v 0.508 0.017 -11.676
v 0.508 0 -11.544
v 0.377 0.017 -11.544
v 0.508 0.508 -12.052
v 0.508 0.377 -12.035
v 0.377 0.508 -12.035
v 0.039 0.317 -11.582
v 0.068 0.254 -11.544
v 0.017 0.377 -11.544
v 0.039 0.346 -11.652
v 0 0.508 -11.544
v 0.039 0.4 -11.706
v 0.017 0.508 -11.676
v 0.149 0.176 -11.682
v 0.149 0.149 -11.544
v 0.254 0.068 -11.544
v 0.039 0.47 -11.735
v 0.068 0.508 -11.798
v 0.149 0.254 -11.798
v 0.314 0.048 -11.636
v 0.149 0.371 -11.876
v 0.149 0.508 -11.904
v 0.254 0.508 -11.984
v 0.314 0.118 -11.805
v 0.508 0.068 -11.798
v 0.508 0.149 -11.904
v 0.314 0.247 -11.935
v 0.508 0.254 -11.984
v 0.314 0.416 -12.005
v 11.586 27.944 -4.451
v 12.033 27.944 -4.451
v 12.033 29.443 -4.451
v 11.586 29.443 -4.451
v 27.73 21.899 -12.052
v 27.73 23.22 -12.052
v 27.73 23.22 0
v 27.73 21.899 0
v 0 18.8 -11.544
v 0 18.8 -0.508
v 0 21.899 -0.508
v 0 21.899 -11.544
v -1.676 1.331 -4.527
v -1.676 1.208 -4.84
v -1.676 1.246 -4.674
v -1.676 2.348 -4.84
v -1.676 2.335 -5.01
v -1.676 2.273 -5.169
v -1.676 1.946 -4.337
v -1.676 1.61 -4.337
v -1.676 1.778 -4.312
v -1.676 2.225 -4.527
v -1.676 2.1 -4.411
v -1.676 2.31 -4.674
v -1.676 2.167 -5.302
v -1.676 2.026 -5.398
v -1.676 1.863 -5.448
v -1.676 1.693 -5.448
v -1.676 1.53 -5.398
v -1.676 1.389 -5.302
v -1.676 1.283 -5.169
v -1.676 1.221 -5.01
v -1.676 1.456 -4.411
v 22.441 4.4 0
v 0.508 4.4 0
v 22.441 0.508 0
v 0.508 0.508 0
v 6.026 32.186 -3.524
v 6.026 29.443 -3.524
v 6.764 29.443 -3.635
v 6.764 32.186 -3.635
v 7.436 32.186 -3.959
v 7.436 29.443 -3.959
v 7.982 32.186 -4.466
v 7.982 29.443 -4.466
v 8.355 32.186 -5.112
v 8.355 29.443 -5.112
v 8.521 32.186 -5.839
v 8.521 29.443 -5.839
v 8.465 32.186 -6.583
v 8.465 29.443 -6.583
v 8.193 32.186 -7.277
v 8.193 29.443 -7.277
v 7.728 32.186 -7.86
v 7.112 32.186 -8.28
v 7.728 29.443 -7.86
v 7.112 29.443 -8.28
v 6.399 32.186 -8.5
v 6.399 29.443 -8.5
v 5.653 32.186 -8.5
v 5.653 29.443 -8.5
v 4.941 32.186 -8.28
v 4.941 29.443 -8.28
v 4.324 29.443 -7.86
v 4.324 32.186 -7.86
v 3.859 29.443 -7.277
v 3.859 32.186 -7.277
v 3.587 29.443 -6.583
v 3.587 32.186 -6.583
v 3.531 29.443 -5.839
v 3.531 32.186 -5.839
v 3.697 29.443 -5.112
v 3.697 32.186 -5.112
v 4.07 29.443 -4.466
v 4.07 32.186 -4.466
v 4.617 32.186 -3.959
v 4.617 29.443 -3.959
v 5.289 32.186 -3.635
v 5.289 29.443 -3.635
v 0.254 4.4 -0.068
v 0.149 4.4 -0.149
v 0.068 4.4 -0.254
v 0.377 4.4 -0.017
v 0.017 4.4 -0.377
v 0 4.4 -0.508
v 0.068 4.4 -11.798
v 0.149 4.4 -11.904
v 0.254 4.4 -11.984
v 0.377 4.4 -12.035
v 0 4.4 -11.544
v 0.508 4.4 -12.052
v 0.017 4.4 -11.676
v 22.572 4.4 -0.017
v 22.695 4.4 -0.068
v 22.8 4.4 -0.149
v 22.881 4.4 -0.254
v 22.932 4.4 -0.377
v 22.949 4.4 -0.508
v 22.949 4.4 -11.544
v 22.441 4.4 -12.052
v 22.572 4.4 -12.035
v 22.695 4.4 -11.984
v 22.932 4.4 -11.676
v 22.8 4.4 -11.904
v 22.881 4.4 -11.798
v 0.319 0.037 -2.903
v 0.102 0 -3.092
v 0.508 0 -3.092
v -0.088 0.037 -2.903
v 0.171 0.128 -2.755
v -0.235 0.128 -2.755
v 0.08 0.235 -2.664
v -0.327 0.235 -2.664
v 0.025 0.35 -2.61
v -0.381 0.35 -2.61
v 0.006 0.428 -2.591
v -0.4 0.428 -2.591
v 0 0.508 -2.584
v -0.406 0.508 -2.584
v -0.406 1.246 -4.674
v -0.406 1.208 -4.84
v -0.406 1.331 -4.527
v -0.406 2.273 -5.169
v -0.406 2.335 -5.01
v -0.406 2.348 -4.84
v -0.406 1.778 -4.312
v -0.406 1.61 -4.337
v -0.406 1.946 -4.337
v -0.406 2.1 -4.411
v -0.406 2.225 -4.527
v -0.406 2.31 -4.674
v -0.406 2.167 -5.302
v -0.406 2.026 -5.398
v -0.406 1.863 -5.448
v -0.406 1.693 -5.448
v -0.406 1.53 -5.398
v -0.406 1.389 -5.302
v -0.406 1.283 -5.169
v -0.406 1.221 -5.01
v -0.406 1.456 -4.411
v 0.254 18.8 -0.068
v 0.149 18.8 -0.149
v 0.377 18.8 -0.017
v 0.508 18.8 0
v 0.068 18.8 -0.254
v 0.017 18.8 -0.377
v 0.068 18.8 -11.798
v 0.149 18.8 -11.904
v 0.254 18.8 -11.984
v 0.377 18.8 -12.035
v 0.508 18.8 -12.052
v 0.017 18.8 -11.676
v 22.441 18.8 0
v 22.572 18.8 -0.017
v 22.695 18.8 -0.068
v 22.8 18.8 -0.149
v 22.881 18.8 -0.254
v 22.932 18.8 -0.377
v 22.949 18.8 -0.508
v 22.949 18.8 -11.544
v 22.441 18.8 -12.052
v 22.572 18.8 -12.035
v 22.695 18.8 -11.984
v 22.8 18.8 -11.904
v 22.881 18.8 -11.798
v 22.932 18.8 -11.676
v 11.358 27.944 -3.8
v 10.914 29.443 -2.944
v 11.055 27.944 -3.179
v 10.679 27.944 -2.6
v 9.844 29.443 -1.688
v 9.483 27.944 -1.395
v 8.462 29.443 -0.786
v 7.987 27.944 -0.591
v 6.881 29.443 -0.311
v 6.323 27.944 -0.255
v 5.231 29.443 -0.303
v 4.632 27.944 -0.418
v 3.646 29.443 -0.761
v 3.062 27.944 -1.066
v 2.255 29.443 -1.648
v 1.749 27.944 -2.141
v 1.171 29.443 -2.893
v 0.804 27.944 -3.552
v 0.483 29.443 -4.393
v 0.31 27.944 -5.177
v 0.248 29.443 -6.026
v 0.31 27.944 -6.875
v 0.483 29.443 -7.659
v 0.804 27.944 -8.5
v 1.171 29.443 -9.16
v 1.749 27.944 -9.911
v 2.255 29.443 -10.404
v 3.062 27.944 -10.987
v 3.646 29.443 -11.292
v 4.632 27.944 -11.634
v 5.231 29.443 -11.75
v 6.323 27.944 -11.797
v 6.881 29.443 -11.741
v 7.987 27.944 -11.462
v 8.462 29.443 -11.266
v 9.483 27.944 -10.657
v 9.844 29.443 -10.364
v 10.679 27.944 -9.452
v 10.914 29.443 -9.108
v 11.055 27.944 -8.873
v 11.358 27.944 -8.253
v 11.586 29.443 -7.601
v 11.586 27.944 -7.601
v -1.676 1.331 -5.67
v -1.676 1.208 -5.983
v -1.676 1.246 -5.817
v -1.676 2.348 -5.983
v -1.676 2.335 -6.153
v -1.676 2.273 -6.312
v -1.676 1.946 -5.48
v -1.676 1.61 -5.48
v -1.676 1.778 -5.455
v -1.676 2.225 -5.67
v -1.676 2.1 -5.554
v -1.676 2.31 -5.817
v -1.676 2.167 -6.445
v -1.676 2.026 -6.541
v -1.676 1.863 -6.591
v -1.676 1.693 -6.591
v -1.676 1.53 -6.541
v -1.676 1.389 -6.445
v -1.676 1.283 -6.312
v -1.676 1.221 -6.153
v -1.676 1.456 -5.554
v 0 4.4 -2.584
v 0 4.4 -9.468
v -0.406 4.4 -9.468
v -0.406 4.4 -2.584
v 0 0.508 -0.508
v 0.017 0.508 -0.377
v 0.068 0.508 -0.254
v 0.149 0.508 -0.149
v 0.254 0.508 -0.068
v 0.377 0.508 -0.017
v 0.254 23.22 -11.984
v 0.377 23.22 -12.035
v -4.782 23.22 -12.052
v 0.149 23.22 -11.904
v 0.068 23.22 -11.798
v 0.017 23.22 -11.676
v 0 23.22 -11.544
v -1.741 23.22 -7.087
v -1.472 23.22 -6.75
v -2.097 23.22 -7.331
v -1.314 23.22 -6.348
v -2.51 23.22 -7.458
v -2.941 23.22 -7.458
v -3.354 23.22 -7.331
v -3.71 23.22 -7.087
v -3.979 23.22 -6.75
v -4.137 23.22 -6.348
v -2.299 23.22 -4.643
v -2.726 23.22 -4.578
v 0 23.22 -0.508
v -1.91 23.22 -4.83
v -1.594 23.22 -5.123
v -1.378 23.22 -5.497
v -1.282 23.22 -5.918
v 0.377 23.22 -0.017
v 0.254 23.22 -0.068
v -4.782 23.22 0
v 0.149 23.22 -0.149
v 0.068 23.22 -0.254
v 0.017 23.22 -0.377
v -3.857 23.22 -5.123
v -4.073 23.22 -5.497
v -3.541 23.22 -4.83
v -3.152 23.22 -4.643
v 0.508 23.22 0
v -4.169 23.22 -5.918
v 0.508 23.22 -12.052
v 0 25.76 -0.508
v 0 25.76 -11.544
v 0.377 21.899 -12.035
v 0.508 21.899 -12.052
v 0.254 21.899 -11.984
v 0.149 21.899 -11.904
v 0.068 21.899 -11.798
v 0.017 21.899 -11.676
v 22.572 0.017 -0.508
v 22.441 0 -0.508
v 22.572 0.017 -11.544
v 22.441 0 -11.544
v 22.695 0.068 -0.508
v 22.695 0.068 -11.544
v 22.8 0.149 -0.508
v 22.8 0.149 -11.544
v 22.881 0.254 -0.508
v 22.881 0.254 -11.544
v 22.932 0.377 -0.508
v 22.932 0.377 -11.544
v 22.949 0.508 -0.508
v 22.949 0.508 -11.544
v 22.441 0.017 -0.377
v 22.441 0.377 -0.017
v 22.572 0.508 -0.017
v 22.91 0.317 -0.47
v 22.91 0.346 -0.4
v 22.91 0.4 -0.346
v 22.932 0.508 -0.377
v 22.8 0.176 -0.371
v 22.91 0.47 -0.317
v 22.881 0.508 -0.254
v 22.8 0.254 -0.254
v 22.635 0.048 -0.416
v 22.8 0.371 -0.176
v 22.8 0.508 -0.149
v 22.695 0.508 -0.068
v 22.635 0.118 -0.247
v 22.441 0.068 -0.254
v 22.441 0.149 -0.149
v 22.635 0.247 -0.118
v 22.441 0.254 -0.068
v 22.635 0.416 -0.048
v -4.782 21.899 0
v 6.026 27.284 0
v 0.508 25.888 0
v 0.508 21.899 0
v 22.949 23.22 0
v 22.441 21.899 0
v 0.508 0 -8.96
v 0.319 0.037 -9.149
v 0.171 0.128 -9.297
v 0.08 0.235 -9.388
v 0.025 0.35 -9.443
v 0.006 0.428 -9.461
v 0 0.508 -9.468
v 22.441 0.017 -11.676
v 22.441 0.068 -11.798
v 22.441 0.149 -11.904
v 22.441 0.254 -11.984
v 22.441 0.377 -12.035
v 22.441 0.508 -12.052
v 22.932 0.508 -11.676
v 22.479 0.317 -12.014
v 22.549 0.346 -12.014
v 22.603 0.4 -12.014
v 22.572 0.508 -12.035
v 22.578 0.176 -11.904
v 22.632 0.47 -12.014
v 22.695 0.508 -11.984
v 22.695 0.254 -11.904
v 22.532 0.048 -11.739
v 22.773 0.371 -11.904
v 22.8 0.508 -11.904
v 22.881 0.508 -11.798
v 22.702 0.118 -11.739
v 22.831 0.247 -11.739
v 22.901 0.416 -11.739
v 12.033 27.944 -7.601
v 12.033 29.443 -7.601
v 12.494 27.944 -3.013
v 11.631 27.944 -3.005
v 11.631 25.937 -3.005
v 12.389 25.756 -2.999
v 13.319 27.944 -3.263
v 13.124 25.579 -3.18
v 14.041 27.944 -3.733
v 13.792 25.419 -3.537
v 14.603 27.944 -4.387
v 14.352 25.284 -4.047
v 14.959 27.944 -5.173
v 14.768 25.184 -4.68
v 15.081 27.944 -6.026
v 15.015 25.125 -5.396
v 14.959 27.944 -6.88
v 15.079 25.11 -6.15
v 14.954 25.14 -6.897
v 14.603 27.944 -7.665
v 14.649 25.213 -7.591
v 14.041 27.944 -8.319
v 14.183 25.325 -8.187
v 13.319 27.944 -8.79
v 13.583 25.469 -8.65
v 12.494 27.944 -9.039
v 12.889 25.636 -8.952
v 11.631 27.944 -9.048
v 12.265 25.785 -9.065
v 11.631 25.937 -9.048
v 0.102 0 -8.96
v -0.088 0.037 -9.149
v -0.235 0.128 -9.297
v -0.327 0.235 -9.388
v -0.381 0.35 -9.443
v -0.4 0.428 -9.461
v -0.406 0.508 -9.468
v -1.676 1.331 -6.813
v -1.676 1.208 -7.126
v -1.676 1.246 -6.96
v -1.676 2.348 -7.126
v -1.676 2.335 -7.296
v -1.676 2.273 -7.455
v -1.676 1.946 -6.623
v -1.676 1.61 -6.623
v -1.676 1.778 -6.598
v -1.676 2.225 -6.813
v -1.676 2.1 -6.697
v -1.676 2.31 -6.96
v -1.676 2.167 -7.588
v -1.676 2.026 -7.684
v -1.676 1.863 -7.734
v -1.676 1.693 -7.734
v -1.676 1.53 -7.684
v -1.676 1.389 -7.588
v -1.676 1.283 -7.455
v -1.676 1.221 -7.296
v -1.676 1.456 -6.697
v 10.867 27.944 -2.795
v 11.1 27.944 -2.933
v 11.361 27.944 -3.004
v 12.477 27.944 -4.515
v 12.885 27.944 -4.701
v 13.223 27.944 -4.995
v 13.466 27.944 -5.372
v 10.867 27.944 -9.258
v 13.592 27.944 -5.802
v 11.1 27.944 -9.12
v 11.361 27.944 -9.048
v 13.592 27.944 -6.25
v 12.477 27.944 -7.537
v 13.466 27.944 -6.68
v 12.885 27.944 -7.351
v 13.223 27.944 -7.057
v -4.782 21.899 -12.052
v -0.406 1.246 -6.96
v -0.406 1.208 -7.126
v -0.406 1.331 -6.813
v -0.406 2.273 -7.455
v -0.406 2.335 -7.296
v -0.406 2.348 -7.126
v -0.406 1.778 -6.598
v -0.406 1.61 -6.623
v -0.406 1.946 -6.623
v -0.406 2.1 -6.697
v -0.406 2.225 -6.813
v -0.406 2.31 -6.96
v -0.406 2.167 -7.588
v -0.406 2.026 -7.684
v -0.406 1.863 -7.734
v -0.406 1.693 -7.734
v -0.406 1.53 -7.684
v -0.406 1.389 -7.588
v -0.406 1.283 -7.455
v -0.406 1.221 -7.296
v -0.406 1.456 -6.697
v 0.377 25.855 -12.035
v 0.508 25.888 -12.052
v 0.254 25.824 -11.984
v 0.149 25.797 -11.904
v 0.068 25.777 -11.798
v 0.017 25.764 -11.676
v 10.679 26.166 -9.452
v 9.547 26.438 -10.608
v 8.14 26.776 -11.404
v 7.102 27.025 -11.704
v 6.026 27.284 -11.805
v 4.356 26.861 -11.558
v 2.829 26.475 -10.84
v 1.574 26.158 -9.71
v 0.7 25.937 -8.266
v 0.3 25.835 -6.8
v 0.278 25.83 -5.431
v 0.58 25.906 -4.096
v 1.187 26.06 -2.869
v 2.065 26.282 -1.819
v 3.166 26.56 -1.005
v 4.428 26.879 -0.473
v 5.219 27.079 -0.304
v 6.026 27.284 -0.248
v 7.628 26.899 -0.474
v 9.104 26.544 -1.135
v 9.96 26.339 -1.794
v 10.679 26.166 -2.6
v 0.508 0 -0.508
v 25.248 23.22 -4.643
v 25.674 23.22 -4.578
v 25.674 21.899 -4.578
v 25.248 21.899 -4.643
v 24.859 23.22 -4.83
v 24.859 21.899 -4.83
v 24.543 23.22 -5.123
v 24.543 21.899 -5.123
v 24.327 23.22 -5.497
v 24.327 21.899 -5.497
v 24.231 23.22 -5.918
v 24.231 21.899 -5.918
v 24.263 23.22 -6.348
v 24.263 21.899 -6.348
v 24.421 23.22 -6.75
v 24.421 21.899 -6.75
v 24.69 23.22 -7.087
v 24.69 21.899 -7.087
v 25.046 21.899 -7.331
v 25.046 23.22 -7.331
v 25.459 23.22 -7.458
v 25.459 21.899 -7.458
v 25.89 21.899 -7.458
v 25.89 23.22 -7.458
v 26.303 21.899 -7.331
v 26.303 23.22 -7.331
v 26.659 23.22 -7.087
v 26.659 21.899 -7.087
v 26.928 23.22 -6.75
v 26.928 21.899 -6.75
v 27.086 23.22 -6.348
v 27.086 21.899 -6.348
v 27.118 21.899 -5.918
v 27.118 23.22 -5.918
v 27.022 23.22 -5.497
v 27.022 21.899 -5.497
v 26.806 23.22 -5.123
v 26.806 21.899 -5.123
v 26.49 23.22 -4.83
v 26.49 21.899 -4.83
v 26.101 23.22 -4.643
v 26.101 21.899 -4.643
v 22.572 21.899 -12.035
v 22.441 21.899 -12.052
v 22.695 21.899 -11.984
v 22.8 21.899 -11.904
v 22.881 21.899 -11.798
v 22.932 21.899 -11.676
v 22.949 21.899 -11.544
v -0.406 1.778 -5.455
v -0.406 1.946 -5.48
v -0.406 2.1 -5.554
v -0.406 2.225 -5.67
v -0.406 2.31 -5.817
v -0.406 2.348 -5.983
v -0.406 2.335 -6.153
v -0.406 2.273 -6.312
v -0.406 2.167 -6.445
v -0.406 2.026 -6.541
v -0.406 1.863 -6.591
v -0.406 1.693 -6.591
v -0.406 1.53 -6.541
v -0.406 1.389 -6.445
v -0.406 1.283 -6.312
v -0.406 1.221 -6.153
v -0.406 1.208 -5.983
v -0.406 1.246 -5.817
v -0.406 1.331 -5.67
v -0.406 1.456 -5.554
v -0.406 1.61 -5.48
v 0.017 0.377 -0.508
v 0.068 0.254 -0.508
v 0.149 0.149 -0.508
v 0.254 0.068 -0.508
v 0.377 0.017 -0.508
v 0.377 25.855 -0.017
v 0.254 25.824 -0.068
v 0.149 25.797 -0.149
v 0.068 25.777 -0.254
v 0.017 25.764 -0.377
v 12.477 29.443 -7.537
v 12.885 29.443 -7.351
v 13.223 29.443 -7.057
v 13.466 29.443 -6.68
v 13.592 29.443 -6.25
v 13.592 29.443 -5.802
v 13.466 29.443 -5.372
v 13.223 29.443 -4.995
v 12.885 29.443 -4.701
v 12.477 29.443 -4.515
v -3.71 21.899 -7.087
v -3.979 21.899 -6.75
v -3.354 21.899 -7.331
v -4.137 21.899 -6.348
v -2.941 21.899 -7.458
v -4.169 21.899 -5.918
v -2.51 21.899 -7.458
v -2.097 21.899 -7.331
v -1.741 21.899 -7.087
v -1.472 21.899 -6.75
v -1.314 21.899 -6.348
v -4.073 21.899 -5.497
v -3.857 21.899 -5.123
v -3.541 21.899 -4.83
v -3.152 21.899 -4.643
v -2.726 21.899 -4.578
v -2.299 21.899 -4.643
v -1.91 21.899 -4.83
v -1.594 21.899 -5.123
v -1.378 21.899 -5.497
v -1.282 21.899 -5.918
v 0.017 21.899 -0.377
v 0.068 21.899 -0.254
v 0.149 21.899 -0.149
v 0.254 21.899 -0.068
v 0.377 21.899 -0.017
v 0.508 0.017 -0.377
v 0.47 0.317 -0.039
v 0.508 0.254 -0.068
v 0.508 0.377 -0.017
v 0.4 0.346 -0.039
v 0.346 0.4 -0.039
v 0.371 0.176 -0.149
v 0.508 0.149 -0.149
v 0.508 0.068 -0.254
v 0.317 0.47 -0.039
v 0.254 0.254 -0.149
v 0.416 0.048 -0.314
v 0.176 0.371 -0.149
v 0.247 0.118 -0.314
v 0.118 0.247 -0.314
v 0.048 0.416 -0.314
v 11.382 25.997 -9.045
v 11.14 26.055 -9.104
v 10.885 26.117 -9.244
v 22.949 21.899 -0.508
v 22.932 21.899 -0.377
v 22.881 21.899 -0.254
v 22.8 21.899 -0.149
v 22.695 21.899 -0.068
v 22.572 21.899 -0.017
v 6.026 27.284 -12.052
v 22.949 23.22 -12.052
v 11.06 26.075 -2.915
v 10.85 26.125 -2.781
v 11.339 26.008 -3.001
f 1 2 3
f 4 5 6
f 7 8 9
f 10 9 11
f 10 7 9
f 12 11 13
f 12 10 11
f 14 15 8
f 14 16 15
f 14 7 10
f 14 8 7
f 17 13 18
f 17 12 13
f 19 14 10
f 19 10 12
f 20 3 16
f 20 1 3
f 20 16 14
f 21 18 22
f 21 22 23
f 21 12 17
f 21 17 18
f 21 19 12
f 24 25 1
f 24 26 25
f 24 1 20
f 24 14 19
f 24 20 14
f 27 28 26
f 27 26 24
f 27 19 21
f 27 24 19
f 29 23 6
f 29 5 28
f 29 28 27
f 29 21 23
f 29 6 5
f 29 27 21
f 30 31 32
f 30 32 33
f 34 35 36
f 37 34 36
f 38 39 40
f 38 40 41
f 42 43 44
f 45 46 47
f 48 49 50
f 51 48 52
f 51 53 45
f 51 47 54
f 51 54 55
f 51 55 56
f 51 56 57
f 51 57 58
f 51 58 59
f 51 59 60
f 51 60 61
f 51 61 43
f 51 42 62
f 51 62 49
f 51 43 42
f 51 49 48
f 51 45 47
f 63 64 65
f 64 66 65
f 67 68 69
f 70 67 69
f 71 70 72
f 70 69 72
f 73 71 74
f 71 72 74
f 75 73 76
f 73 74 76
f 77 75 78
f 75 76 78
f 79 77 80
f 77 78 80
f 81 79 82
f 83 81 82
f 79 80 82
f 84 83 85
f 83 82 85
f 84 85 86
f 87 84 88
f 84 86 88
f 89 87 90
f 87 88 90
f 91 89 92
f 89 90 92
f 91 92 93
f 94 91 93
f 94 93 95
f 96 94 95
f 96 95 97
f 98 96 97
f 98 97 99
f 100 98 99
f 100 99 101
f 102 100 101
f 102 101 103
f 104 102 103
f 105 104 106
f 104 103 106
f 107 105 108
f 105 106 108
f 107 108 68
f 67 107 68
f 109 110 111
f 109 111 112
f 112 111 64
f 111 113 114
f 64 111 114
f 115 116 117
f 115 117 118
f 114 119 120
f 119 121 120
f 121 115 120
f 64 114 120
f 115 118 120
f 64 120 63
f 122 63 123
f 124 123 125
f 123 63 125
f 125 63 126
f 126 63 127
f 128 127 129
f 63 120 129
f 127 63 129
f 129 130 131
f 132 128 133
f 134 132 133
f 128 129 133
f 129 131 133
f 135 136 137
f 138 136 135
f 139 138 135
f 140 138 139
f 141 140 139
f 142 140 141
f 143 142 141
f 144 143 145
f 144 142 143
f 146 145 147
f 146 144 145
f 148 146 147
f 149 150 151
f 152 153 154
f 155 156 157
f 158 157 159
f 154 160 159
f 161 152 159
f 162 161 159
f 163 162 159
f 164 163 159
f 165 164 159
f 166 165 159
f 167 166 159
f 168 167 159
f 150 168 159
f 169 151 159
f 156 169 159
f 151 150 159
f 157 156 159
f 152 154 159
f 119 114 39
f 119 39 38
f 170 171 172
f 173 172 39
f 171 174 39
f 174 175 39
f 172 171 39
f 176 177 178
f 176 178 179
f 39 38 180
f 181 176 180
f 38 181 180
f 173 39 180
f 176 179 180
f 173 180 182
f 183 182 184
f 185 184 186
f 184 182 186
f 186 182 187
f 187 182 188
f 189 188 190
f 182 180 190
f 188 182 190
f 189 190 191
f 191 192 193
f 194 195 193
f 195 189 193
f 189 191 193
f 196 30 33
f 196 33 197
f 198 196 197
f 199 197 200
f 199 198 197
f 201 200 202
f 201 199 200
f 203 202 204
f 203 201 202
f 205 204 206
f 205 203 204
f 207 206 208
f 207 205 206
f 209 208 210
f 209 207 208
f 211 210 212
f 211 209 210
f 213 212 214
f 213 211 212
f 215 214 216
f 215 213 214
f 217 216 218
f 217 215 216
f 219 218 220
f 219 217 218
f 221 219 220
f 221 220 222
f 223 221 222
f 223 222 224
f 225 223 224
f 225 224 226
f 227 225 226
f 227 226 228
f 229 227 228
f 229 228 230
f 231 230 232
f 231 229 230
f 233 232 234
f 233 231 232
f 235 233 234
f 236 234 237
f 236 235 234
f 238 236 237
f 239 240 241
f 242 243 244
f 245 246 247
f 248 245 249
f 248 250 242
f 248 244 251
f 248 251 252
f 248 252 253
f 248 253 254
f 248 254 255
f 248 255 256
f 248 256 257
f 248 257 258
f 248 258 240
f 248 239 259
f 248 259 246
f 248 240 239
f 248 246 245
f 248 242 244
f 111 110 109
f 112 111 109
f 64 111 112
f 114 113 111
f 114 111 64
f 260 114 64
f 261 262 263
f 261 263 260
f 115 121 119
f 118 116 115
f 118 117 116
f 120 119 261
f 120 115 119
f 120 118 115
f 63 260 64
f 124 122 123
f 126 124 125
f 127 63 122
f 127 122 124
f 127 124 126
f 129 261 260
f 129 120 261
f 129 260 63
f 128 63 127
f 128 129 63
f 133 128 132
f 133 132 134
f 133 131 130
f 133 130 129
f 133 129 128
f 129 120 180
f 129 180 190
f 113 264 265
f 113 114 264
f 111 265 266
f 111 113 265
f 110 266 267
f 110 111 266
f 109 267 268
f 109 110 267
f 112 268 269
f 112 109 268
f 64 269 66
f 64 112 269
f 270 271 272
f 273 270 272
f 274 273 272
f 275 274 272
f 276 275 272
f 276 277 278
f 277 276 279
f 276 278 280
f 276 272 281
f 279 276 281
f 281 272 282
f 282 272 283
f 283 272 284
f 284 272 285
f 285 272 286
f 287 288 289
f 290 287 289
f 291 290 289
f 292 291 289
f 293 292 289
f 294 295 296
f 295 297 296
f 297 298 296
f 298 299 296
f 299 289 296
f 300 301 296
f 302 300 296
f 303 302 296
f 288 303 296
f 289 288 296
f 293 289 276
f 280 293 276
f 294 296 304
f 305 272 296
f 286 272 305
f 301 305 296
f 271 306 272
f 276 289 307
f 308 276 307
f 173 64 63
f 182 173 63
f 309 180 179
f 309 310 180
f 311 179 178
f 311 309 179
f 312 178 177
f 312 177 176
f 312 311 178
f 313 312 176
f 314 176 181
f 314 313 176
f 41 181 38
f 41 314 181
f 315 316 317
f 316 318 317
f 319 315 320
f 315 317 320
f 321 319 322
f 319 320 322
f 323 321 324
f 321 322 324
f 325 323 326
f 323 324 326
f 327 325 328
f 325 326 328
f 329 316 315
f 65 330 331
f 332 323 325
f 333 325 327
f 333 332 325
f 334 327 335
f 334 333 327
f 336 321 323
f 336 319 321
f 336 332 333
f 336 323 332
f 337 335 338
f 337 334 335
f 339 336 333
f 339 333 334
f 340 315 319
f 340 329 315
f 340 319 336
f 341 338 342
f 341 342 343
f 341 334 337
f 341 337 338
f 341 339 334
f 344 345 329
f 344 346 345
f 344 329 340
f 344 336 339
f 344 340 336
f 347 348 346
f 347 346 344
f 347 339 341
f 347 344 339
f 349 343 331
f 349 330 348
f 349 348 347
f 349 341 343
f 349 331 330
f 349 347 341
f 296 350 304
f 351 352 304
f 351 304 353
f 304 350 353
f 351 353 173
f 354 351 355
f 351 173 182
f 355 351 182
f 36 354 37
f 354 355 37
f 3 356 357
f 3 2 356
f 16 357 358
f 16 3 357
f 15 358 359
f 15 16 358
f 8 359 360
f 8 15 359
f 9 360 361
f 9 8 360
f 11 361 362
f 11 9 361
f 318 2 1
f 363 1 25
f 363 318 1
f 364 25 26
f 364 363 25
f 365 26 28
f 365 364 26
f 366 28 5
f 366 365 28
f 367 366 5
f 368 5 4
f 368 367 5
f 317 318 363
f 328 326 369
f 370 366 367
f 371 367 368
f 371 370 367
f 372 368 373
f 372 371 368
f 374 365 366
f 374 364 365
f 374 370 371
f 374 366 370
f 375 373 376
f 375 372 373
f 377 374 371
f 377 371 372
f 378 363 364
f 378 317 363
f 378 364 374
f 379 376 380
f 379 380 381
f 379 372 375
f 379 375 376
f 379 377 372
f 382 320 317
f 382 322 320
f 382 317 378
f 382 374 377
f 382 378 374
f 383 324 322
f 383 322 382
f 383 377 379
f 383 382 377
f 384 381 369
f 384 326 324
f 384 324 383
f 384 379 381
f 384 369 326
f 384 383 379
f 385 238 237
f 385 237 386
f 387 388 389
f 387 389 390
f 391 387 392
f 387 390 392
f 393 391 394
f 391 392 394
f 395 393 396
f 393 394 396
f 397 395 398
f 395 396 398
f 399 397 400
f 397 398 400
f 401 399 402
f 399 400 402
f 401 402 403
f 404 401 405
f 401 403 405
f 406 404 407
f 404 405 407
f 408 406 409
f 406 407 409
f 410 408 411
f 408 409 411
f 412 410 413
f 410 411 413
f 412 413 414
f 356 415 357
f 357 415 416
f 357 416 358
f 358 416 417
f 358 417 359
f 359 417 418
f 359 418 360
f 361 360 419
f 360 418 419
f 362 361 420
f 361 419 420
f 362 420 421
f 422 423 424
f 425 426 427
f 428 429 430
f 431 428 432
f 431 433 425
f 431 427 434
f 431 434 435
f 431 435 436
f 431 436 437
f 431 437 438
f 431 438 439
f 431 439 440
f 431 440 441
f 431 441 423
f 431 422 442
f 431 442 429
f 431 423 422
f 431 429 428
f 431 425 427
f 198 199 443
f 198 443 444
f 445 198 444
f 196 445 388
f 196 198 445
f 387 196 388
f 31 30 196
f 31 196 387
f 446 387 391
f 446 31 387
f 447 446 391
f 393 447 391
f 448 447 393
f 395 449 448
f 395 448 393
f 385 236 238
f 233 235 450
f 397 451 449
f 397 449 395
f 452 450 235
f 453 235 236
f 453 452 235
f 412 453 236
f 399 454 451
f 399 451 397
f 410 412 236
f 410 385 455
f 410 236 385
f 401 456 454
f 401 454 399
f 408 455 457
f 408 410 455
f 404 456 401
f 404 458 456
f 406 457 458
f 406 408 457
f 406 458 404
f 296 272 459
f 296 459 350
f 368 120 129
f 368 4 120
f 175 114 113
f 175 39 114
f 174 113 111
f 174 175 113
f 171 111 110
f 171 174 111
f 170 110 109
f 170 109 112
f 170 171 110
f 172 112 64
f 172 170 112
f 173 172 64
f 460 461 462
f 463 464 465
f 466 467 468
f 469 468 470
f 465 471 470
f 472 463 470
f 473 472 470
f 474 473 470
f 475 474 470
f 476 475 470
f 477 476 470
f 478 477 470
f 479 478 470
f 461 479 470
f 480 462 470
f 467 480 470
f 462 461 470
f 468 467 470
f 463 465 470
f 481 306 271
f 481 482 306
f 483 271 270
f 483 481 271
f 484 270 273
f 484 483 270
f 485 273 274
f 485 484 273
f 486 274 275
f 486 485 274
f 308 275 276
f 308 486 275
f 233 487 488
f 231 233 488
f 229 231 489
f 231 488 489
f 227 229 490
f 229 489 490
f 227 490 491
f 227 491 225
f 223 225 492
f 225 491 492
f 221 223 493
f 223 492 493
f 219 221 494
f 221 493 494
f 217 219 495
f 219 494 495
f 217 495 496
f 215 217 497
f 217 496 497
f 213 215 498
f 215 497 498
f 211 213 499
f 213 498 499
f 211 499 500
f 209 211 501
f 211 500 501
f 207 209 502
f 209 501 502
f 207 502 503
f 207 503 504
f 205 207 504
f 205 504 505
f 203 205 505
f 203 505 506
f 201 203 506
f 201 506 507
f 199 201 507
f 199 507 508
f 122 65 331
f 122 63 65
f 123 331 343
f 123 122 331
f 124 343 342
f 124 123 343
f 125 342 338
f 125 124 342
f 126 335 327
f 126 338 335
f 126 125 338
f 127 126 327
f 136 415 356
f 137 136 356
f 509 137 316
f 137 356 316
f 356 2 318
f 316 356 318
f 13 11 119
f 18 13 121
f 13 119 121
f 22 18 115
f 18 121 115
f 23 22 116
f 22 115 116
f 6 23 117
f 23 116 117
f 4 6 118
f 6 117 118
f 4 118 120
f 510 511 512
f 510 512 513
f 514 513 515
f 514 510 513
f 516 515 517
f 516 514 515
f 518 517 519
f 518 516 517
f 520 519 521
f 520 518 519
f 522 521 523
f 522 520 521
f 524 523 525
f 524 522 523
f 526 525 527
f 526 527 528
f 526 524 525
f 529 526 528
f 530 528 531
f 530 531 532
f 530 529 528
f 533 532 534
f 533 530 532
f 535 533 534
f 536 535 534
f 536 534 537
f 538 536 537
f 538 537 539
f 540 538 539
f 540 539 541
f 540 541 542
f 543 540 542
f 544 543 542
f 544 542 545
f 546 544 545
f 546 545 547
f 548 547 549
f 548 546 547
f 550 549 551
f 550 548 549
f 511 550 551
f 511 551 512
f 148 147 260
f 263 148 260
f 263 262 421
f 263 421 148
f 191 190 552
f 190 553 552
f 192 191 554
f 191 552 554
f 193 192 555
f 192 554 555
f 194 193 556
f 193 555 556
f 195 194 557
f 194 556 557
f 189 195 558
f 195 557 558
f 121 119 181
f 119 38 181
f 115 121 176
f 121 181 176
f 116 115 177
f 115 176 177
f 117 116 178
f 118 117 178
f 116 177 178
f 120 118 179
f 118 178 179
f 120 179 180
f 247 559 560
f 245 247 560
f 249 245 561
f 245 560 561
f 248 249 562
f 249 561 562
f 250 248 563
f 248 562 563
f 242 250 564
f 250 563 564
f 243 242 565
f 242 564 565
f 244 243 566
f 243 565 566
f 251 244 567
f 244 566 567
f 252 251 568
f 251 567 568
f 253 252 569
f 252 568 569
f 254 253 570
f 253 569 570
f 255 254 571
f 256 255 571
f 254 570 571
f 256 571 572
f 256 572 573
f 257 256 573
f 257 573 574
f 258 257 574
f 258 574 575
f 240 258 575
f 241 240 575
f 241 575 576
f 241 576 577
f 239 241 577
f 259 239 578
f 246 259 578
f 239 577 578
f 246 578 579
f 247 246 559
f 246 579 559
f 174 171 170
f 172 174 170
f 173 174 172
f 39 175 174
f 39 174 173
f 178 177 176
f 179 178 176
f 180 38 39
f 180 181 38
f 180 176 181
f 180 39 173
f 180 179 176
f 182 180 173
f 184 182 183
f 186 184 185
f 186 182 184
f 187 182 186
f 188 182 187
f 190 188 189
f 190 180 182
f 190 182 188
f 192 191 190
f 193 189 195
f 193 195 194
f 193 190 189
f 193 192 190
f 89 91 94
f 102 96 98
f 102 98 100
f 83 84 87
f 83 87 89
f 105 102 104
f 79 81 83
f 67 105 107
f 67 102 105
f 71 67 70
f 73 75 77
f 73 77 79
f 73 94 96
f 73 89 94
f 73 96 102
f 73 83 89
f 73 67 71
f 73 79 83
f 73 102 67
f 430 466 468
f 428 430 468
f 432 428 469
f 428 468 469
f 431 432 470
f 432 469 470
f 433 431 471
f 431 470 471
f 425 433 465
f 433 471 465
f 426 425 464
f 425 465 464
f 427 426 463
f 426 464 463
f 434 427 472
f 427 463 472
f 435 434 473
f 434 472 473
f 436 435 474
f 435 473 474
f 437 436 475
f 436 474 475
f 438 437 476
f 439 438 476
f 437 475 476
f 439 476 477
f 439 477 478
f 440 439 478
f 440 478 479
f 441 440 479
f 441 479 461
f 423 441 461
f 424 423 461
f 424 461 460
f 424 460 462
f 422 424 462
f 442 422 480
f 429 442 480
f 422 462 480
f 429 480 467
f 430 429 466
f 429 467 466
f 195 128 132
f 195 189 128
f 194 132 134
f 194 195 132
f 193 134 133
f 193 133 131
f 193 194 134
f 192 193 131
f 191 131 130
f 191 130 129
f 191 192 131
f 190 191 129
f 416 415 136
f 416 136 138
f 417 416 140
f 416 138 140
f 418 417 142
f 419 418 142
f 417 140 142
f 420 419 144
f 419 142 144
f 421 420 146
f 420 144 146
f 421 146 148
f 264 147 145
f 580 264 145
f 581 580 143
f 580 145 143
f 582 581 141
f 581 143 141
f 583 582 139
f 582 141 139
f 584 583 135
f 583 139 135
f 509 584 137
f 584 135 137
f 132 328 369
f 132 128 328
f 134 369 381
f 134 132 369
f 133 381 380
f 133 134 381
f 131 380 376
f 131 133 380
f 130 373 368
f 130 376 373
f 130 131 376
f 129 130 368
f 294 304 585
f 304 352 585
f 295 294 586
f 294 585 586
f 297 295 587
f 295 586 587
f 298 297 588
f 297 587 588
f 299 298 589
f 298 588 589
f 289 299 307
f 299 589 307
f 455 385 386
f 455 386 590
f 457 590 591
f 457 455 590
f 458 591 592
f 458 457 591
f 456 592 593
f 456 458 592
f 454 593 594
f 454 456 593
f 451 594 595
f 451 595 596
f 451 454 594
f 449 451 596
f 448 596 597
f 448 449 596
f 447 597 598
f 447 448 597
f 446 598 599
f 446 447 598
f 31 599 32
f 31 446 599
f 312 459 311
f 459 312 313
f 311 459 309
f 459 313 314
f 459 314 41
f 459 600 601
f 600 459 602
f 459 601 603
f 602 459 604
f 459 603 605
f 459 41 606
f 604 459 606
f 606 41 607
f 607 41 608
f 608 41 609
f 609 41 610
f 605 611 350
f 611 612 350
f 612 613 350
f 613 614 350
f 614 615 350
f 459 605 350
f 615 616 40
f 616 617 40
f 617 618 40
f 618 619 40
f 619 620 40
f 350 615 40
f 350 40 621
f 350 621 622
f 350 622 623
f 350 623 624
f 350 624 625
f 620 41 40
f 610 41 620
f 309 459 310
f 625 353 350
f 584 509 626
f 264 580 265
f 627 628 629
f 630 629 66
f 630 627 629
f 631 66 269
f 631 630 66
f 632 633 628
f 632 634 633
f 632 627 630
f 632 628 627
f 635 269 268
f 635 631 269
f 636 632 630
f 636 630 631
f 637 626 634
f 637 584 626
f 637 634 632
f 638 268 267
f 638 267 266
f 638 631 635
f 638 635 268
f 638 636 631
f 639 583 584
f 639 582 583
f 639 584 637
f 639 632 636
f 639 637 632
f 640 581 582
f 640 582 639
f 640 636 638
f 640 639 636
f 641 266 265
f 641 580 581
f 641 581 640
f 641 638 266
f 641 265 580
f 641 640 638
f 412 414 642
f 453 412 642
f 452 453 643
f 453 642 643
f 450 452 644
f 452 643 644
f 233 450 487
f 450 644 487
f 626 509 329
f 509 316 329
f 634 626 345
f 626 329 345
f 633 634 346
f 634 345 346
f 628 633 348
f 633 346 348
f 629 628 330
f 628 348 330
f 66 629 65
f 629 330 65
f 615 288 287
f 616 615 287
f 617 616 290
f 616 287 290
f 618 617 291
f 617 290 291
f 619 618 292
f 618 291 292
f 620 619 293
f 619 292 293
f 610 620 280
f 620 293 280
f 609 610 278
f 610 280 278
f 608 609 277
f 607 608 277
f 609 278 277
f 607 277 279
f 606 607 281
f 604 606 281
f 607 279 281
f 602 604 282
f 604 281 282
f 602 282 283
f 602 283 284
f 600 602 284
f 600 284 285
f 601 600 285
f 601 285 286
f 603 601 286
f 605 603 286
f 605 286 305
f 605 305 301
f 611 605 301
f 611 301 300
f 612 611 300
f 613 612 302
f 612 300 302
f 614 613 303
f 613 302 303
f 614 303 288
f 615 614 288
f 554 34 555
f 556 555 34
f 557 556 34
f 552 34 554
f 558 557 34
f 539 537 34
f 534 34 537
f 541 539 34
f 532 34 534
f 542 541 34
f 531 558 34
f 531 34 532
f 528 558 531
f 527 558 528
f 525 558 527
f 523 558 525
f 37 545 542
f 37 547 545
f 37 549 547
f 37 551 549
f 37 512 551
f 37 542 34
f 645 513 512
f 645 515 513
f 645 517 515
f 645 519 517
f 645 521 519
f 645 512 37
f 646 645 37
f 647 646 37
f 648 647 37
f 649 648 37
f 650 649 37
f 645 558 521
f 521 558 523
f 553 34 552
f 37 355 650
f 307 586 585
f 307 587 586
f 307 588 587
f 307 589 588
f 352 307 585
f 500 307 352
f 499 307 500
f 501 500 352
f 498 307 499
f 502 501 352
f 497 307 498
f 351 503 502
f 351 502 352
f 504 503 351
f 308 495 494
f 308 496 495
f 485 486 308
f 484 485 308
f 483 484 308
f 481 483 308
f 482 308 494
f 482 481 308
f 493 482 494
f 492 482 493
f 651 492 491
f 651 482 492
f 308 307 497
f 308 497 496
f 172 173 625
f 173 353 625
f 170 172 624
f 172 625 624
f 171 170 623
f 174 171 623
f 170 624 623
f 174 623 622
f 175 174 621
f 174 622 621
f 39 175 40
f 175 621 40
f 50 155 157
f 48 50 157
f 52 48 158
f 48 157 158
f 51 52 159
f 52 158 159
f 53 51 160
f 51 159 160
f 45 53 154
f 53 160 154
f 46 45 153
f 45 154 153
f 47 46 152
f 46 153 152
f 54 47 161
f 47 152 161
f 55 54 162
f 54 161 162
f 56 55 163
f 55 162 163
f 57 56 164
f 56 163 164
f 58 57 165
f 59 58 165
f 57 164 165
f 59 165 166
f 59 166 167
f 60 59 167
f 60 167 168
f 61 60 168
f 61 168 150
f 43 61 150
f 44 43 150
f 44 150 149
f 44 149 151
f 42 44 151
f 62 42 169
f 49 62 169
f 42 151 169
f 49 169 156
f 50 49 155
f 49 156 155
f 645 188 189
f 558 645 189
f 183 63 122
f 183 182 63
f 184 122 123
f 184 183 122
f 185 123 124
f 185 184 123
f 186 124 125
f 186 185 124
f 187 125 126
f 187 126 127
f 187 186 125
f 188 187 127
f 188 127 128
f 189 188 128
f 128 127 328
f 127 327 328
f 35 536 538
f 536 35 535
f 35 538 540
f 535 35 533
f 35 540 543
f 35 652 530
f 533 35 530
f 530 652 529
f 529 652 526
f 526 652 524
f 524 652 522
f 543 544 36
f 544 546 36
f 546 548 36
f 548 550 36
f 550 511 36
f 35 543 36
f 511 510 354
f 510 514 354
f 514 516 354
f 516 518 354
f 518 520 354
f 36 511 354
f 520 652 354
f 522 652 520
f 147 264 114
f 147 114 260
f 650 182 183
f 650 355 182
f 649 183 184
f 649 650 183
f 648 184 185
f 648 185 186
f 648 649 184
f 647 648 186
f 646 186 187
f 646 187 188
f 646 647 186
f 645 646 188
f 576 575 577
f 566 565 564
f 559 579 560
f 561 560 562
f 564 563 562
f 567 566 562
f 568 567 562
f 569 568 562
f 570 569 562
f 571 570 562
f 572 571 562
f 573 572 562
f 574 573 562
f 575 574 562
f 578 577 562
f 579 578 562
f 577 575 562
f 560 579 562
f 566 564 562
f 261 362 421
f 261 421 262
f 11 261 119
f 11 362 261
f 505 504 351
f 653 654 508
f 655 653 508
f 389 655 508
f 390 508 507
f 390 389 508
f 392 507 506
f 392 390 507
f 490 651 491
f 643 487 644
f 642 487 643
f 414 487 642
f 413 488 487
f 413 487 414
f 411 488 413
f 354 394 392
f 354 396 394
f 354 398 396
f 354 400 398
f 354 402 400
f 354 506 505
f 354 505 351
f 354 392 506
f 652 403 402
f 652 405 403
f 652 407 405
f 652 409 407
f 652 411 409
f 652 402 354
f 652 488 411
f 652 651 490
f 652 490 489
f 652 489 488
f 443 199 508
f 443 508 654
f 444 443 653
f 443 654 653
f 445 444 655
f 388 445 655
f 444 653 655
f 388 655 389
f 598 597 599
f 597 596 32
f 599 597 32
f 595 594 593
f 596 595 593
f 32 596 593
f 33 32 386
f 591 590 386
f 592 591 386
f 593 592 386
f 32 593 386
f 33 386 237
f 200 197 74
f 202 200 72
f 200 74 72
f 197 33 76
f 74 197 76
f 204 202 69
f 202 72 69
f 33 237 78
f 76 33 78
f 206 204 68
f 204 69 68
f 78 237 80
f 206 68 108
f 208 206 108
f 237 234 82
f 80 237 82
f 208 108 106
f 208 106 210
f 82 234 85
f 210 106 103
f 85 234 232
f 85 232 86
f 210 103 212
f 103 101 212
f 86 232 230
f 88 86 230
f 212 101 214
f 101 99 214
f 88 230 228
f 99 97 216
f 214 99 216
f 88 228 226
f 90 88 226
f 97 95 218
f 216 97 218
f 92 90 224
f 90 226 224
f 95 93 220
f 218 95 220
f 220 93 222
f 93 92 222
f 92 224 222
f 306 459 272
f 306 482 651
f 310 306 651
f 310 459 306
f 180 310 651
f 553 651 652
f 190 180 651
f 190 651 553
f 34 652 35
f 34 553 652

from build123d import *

# Parameters (mm, degrees)
SKETCH1_W              = 22.9489
SKETCH1_H              = 12.0523
BOSS_EXTRUDE1_DEPTH    = 4.4
SKETCH2_W              = 22.9489
SKETCH2_H              = 12.0523
BOSS_EXTRUDE4_DEPTH    = 14.4
SKETCH5_W              = 22.9489
SKETCH5_H              = 12.0523
BOSS_EXTRUDE6_DEPTH    = 4.4196
SKETCH7_W              = 12.0523
SKETCH7_H              = 1.3208
BOSS_EXTRUDE9_DEPTH    = 4.78155
SKETCH10_R             = 1.4478
CUT_EXTRUDE1_DEPTH     = 1.3208
BOSS_EXTRUDE10_DEPTH   = 4.7244
FILLET1_R              = 0.508
BOSS_EXTRUDE11_DEPTH   = 1.4986
SKETCH13_R             = 2.5019
BOSS_EXTRUDE12_DEPTH   = 2.7432
SKETCH14_W             = 6.8834
SKETCH14_H             = 4.4
BOSS_EXTRUDE14_DEPTH   = 0.4064
SKETCH15_R             = 0.5715
BOSS_EXTRUDE15_DEPTH   = 1.27
BOSS_EXTRUDE15_2_DEPTH = 1.27
BOSS_EXTRUDE15_3_DEPTH = 1.27
FILLET4_R              = 0.508
BOSS_EXTRUDE16_DEPTH   = 12.0523
FILLET5_R              = 0.508


with BuildPart() as part:
    # Sketch1 → Boss-Extrude1 (new body)
    with BuildSketch(Plane(origin=(0, 0, 0), x_dir=(1, 0, 0), z_dir=(0, 1, 0))):
        with Locations((11.47445, 6.02615)):
            Rectangle(SKETCH1_W, SKETCH1_H)
    extrude(amount=BOSS_EXTRUDE1_DEPTH)

    # Sketch14 → Boss-Extrude14 (add)
    with BuildSketch(Plane.ZY):
        with Locations((-6.02615, 2.2)):
            Rectangle(SKETCH14_W, SKETCH14_H)
    extrude(amount=BOSS_EXTRUDE14_DEPTH)

    # Fillet4
    fillet4_edges = [part.edges().sort_by_distance(p)[0] for p in [
        (-0.2032, 0, -9.46785),
        (-0.4064, 0, -6.02615),
        (-0.2032, 0, -2.58445),
        (0, 0, -1.292225),
        (11.47445, 0, 0),
        (22.9489, 0, -6.02615),
        (11.47445, 0, -12.0523),
        (0, 0, -10.760075),
        (0, 2.2, 0),
        (22.9489, 2.2, 0),
        (22.9489, 2.2, -12.0523),
        (0, 2.2, -12.0523),
    ]]
    fillet(fillet4_edges, radius=FILLET4_R)


with BuildPart() as body_2:
    # Sketch2 → Boss-Extrude4 (new body)
    with BuildSketch(Plane(origin=(0, 4.4, 0), x_dir=(1, 0, 0), z_dir=(0, 1, 0))):
        with Locations((11.47445, 6.02615)):
            Rectangle(SKETCH2_W, SKETCH2_H)
    extrude(amount=BOSS_EXTRUDE4_DEPTH)

    # Fillet1
    fillet1_edges = [body_2.edges().sort_by_distance(p)[0] for p in [
        (0, 11.6, -12.0523),
        (22.9489, 11.6, -12.0523),
        (22.9489, 11.6, 0),
        (0, 11.6, 0),
    ]]
    fillet(fillet1_edges, radius=FILLET1_R)


with BuildPart() as body_3:
    # Sketch5 → Boss-Extrude6 (new body)
    with BuildSketch(Plane(origin=(0, 18.8, 0), x_dir=(1, 0, 0), z_dir=(0, 1, 0))):
        with Locations((11.47445, 6.02615)):
            Rectangle(SKETCH5_W, SKETCH5_H)
    extrude(amount=BOSS_EXTRUDE6_DEPTH)

    # Sketch7 → Boss-Extrude9 (add)
    with BuildSketch(Plane.ZY):
        with Locations((-6.02615, 22.5592)):
            Rectangle(SKETCH7_W, SKETCH7_H)
    boss_extrude9 = extrude(amount=BOSS_EXTRUDE9_DEPTH)

    # Sketch10 → Cut-Extrude1 (cut)
    with BuildSketch(Plane(origin=(0, 23.2196, 0), x_dir=(1, 0, 0), z_dir=(0, 1, 0))):
        with Locations(Location((-2.72555, 6.02615, 0), (0, 0, 270))):
            Circle(SKETCH10_R)
    cut_extrude1 = extrude(amount=-CUT_EXTRUDE1_DEPTH, mode=Mode.SUBTRACT)

    # Mirror1: Boss-Extrude9, Cut-Extrude1 across plane
    add(boss_extrude9.mirror(Plane.ZY.offset(-11.47445)))
    add(cut_extrude1.mirror(Plane.ZY.offset(-11.47445)), mode=Mode.SUBTRACT)



with BuildPart() as body_4:
    # Sketch11 → Boss-Extrude10 (new body)
    with BuildSketch(Plane(origin=(0, 23.2196, 0), x_dir=(1, 0, 0), z_dir=(0, 1, 0))):
        with BuildLine():
            ThreePointArc((10.679388997, 9.452289093), (0.24765, 6.02615), (10.679388997, 2.600010907))
            ThreePointArc((10.679388997, 2.600010907), (11.100056709, 2.932632777), (11.631468182, 3.004747119))
            ThreePointArc((11.631468182, 3.004747119), (15.08125, 6.02615), (11.631468182, 9.047552881))
            ThreePointArc((11.631468182, 9.047552881), (11.100056709, 9.119667223), (10.679388997, 9.452289093))
        make_face()
    extrude(amount=BOSS_EXTRUDE10_DEPTH)

    # Sketch12 → Boss-Extrude11 (add)
    with BuildSketch(Plane(origin=(0, 27.944, 0), x_dir=(1, 0, 0), z_dir=(0, 1, 0))):
        with BuildLine():
            Line((12.03325, 4.45135), (11.585922226, 4.45135))
            ThreePointArc((11.585922226, 4.45135), (0.24765, 6.02615), (11.585922226, 7.60095))
            Line((11.585922226, 7.60095), (12.03325, 7.60095))
            ThreePointArc((12.03325, 7.60095), (13.60805, 6.02615), (12.03325, 4.45135))
        make_face()
    extrude(amount=BOSS_EXTRUDE11_DEPTH)

    # Sketch13 → Boss-Extrude12 (add)
    with BuildSketch(Plane(origin=(0, 29.4426, 0), x_dir=(1, 0, 0), z_dir=(0, 1, 0))):
        with Locations(Location((6.02615, 6.02615, 0), (0, 0, 270))):
            Circle(SKETCH13_R)
    extrude(amount=BOSS_EXTRUDE12_DEPTH)


with BuildPart() as body_5:
    # Sketch15 → Boss-Extrude15 (new body)
    with BuildSketch(Plane.ZY.offset(0.4064)):
        with Locations((-6.02615, 1.778)):
            Circle(SKETCH15_R)
    extrude(amount=BOSS_EXTRUDE15_DEPTH)


with BuildPart() as body_6:
    # Sketch15 → Boss-Extrude15 2 (new body)
    with BuildSketch(Plane.ZY.offset(0.4064)):
        with Locations((-4.88315, 1.778)):
            Circle(SKETCH15_R)
    extrude(amount=BOSS_EXTRUDE15_2_DEPTH)


with BuildPart() as body_7:
    # Sketch15 → Boss-Extrude15 3 (new body)
    with BuildSketch(Plane.ZY.offset(0.4064)):
        with Locations((-7.16915, 1.778)):
            Circle(SKETCH15_R)
    extrude(amount=BOSS_EXTRUDE15_3_DEPTH)


with BuildPart() as body_3_1:
    add(body_3.part)

    add(body_4.part)  # Boss-Extrude16 merges body 4
    # 3DSketch1 → Boss-Extrude16 (add, through all)
    with BuildSketch(Plane(origin=(6.02615, 27.2836, -12.0523), x_dir=(0.972354173200553, -0.23351094590932797, 0), z_dir=(0, 0, -1))):
        Polygon((0, 0), (17.403895069, 0), (-4.910563617, 5.358819347), (-5.503681419, 2.889039747), align=None)
    extrude(amount=-BOSS_EXTRUDE16_DEPTH)

    # Fillet5
    fillet5_edges = [body_3_1.edges().sort_by_distance(p)[0] for p in [
        (0, 24.4896, 0),
        (0, 24.4896, -12.0523),
        (0, 20.3494, -12.0523),
        (22.9489, 20.3494, -12.0523),
        (22.9489, 20.3494, 0),
        (0, 20.3494, 0),
    ]]
    fillet(fillet5_edges, radius=FILLET5_R)


solid = Compound([part.part, body_2.part, body_5.part, body_6.part, body_7.part, body_3_1.part])
